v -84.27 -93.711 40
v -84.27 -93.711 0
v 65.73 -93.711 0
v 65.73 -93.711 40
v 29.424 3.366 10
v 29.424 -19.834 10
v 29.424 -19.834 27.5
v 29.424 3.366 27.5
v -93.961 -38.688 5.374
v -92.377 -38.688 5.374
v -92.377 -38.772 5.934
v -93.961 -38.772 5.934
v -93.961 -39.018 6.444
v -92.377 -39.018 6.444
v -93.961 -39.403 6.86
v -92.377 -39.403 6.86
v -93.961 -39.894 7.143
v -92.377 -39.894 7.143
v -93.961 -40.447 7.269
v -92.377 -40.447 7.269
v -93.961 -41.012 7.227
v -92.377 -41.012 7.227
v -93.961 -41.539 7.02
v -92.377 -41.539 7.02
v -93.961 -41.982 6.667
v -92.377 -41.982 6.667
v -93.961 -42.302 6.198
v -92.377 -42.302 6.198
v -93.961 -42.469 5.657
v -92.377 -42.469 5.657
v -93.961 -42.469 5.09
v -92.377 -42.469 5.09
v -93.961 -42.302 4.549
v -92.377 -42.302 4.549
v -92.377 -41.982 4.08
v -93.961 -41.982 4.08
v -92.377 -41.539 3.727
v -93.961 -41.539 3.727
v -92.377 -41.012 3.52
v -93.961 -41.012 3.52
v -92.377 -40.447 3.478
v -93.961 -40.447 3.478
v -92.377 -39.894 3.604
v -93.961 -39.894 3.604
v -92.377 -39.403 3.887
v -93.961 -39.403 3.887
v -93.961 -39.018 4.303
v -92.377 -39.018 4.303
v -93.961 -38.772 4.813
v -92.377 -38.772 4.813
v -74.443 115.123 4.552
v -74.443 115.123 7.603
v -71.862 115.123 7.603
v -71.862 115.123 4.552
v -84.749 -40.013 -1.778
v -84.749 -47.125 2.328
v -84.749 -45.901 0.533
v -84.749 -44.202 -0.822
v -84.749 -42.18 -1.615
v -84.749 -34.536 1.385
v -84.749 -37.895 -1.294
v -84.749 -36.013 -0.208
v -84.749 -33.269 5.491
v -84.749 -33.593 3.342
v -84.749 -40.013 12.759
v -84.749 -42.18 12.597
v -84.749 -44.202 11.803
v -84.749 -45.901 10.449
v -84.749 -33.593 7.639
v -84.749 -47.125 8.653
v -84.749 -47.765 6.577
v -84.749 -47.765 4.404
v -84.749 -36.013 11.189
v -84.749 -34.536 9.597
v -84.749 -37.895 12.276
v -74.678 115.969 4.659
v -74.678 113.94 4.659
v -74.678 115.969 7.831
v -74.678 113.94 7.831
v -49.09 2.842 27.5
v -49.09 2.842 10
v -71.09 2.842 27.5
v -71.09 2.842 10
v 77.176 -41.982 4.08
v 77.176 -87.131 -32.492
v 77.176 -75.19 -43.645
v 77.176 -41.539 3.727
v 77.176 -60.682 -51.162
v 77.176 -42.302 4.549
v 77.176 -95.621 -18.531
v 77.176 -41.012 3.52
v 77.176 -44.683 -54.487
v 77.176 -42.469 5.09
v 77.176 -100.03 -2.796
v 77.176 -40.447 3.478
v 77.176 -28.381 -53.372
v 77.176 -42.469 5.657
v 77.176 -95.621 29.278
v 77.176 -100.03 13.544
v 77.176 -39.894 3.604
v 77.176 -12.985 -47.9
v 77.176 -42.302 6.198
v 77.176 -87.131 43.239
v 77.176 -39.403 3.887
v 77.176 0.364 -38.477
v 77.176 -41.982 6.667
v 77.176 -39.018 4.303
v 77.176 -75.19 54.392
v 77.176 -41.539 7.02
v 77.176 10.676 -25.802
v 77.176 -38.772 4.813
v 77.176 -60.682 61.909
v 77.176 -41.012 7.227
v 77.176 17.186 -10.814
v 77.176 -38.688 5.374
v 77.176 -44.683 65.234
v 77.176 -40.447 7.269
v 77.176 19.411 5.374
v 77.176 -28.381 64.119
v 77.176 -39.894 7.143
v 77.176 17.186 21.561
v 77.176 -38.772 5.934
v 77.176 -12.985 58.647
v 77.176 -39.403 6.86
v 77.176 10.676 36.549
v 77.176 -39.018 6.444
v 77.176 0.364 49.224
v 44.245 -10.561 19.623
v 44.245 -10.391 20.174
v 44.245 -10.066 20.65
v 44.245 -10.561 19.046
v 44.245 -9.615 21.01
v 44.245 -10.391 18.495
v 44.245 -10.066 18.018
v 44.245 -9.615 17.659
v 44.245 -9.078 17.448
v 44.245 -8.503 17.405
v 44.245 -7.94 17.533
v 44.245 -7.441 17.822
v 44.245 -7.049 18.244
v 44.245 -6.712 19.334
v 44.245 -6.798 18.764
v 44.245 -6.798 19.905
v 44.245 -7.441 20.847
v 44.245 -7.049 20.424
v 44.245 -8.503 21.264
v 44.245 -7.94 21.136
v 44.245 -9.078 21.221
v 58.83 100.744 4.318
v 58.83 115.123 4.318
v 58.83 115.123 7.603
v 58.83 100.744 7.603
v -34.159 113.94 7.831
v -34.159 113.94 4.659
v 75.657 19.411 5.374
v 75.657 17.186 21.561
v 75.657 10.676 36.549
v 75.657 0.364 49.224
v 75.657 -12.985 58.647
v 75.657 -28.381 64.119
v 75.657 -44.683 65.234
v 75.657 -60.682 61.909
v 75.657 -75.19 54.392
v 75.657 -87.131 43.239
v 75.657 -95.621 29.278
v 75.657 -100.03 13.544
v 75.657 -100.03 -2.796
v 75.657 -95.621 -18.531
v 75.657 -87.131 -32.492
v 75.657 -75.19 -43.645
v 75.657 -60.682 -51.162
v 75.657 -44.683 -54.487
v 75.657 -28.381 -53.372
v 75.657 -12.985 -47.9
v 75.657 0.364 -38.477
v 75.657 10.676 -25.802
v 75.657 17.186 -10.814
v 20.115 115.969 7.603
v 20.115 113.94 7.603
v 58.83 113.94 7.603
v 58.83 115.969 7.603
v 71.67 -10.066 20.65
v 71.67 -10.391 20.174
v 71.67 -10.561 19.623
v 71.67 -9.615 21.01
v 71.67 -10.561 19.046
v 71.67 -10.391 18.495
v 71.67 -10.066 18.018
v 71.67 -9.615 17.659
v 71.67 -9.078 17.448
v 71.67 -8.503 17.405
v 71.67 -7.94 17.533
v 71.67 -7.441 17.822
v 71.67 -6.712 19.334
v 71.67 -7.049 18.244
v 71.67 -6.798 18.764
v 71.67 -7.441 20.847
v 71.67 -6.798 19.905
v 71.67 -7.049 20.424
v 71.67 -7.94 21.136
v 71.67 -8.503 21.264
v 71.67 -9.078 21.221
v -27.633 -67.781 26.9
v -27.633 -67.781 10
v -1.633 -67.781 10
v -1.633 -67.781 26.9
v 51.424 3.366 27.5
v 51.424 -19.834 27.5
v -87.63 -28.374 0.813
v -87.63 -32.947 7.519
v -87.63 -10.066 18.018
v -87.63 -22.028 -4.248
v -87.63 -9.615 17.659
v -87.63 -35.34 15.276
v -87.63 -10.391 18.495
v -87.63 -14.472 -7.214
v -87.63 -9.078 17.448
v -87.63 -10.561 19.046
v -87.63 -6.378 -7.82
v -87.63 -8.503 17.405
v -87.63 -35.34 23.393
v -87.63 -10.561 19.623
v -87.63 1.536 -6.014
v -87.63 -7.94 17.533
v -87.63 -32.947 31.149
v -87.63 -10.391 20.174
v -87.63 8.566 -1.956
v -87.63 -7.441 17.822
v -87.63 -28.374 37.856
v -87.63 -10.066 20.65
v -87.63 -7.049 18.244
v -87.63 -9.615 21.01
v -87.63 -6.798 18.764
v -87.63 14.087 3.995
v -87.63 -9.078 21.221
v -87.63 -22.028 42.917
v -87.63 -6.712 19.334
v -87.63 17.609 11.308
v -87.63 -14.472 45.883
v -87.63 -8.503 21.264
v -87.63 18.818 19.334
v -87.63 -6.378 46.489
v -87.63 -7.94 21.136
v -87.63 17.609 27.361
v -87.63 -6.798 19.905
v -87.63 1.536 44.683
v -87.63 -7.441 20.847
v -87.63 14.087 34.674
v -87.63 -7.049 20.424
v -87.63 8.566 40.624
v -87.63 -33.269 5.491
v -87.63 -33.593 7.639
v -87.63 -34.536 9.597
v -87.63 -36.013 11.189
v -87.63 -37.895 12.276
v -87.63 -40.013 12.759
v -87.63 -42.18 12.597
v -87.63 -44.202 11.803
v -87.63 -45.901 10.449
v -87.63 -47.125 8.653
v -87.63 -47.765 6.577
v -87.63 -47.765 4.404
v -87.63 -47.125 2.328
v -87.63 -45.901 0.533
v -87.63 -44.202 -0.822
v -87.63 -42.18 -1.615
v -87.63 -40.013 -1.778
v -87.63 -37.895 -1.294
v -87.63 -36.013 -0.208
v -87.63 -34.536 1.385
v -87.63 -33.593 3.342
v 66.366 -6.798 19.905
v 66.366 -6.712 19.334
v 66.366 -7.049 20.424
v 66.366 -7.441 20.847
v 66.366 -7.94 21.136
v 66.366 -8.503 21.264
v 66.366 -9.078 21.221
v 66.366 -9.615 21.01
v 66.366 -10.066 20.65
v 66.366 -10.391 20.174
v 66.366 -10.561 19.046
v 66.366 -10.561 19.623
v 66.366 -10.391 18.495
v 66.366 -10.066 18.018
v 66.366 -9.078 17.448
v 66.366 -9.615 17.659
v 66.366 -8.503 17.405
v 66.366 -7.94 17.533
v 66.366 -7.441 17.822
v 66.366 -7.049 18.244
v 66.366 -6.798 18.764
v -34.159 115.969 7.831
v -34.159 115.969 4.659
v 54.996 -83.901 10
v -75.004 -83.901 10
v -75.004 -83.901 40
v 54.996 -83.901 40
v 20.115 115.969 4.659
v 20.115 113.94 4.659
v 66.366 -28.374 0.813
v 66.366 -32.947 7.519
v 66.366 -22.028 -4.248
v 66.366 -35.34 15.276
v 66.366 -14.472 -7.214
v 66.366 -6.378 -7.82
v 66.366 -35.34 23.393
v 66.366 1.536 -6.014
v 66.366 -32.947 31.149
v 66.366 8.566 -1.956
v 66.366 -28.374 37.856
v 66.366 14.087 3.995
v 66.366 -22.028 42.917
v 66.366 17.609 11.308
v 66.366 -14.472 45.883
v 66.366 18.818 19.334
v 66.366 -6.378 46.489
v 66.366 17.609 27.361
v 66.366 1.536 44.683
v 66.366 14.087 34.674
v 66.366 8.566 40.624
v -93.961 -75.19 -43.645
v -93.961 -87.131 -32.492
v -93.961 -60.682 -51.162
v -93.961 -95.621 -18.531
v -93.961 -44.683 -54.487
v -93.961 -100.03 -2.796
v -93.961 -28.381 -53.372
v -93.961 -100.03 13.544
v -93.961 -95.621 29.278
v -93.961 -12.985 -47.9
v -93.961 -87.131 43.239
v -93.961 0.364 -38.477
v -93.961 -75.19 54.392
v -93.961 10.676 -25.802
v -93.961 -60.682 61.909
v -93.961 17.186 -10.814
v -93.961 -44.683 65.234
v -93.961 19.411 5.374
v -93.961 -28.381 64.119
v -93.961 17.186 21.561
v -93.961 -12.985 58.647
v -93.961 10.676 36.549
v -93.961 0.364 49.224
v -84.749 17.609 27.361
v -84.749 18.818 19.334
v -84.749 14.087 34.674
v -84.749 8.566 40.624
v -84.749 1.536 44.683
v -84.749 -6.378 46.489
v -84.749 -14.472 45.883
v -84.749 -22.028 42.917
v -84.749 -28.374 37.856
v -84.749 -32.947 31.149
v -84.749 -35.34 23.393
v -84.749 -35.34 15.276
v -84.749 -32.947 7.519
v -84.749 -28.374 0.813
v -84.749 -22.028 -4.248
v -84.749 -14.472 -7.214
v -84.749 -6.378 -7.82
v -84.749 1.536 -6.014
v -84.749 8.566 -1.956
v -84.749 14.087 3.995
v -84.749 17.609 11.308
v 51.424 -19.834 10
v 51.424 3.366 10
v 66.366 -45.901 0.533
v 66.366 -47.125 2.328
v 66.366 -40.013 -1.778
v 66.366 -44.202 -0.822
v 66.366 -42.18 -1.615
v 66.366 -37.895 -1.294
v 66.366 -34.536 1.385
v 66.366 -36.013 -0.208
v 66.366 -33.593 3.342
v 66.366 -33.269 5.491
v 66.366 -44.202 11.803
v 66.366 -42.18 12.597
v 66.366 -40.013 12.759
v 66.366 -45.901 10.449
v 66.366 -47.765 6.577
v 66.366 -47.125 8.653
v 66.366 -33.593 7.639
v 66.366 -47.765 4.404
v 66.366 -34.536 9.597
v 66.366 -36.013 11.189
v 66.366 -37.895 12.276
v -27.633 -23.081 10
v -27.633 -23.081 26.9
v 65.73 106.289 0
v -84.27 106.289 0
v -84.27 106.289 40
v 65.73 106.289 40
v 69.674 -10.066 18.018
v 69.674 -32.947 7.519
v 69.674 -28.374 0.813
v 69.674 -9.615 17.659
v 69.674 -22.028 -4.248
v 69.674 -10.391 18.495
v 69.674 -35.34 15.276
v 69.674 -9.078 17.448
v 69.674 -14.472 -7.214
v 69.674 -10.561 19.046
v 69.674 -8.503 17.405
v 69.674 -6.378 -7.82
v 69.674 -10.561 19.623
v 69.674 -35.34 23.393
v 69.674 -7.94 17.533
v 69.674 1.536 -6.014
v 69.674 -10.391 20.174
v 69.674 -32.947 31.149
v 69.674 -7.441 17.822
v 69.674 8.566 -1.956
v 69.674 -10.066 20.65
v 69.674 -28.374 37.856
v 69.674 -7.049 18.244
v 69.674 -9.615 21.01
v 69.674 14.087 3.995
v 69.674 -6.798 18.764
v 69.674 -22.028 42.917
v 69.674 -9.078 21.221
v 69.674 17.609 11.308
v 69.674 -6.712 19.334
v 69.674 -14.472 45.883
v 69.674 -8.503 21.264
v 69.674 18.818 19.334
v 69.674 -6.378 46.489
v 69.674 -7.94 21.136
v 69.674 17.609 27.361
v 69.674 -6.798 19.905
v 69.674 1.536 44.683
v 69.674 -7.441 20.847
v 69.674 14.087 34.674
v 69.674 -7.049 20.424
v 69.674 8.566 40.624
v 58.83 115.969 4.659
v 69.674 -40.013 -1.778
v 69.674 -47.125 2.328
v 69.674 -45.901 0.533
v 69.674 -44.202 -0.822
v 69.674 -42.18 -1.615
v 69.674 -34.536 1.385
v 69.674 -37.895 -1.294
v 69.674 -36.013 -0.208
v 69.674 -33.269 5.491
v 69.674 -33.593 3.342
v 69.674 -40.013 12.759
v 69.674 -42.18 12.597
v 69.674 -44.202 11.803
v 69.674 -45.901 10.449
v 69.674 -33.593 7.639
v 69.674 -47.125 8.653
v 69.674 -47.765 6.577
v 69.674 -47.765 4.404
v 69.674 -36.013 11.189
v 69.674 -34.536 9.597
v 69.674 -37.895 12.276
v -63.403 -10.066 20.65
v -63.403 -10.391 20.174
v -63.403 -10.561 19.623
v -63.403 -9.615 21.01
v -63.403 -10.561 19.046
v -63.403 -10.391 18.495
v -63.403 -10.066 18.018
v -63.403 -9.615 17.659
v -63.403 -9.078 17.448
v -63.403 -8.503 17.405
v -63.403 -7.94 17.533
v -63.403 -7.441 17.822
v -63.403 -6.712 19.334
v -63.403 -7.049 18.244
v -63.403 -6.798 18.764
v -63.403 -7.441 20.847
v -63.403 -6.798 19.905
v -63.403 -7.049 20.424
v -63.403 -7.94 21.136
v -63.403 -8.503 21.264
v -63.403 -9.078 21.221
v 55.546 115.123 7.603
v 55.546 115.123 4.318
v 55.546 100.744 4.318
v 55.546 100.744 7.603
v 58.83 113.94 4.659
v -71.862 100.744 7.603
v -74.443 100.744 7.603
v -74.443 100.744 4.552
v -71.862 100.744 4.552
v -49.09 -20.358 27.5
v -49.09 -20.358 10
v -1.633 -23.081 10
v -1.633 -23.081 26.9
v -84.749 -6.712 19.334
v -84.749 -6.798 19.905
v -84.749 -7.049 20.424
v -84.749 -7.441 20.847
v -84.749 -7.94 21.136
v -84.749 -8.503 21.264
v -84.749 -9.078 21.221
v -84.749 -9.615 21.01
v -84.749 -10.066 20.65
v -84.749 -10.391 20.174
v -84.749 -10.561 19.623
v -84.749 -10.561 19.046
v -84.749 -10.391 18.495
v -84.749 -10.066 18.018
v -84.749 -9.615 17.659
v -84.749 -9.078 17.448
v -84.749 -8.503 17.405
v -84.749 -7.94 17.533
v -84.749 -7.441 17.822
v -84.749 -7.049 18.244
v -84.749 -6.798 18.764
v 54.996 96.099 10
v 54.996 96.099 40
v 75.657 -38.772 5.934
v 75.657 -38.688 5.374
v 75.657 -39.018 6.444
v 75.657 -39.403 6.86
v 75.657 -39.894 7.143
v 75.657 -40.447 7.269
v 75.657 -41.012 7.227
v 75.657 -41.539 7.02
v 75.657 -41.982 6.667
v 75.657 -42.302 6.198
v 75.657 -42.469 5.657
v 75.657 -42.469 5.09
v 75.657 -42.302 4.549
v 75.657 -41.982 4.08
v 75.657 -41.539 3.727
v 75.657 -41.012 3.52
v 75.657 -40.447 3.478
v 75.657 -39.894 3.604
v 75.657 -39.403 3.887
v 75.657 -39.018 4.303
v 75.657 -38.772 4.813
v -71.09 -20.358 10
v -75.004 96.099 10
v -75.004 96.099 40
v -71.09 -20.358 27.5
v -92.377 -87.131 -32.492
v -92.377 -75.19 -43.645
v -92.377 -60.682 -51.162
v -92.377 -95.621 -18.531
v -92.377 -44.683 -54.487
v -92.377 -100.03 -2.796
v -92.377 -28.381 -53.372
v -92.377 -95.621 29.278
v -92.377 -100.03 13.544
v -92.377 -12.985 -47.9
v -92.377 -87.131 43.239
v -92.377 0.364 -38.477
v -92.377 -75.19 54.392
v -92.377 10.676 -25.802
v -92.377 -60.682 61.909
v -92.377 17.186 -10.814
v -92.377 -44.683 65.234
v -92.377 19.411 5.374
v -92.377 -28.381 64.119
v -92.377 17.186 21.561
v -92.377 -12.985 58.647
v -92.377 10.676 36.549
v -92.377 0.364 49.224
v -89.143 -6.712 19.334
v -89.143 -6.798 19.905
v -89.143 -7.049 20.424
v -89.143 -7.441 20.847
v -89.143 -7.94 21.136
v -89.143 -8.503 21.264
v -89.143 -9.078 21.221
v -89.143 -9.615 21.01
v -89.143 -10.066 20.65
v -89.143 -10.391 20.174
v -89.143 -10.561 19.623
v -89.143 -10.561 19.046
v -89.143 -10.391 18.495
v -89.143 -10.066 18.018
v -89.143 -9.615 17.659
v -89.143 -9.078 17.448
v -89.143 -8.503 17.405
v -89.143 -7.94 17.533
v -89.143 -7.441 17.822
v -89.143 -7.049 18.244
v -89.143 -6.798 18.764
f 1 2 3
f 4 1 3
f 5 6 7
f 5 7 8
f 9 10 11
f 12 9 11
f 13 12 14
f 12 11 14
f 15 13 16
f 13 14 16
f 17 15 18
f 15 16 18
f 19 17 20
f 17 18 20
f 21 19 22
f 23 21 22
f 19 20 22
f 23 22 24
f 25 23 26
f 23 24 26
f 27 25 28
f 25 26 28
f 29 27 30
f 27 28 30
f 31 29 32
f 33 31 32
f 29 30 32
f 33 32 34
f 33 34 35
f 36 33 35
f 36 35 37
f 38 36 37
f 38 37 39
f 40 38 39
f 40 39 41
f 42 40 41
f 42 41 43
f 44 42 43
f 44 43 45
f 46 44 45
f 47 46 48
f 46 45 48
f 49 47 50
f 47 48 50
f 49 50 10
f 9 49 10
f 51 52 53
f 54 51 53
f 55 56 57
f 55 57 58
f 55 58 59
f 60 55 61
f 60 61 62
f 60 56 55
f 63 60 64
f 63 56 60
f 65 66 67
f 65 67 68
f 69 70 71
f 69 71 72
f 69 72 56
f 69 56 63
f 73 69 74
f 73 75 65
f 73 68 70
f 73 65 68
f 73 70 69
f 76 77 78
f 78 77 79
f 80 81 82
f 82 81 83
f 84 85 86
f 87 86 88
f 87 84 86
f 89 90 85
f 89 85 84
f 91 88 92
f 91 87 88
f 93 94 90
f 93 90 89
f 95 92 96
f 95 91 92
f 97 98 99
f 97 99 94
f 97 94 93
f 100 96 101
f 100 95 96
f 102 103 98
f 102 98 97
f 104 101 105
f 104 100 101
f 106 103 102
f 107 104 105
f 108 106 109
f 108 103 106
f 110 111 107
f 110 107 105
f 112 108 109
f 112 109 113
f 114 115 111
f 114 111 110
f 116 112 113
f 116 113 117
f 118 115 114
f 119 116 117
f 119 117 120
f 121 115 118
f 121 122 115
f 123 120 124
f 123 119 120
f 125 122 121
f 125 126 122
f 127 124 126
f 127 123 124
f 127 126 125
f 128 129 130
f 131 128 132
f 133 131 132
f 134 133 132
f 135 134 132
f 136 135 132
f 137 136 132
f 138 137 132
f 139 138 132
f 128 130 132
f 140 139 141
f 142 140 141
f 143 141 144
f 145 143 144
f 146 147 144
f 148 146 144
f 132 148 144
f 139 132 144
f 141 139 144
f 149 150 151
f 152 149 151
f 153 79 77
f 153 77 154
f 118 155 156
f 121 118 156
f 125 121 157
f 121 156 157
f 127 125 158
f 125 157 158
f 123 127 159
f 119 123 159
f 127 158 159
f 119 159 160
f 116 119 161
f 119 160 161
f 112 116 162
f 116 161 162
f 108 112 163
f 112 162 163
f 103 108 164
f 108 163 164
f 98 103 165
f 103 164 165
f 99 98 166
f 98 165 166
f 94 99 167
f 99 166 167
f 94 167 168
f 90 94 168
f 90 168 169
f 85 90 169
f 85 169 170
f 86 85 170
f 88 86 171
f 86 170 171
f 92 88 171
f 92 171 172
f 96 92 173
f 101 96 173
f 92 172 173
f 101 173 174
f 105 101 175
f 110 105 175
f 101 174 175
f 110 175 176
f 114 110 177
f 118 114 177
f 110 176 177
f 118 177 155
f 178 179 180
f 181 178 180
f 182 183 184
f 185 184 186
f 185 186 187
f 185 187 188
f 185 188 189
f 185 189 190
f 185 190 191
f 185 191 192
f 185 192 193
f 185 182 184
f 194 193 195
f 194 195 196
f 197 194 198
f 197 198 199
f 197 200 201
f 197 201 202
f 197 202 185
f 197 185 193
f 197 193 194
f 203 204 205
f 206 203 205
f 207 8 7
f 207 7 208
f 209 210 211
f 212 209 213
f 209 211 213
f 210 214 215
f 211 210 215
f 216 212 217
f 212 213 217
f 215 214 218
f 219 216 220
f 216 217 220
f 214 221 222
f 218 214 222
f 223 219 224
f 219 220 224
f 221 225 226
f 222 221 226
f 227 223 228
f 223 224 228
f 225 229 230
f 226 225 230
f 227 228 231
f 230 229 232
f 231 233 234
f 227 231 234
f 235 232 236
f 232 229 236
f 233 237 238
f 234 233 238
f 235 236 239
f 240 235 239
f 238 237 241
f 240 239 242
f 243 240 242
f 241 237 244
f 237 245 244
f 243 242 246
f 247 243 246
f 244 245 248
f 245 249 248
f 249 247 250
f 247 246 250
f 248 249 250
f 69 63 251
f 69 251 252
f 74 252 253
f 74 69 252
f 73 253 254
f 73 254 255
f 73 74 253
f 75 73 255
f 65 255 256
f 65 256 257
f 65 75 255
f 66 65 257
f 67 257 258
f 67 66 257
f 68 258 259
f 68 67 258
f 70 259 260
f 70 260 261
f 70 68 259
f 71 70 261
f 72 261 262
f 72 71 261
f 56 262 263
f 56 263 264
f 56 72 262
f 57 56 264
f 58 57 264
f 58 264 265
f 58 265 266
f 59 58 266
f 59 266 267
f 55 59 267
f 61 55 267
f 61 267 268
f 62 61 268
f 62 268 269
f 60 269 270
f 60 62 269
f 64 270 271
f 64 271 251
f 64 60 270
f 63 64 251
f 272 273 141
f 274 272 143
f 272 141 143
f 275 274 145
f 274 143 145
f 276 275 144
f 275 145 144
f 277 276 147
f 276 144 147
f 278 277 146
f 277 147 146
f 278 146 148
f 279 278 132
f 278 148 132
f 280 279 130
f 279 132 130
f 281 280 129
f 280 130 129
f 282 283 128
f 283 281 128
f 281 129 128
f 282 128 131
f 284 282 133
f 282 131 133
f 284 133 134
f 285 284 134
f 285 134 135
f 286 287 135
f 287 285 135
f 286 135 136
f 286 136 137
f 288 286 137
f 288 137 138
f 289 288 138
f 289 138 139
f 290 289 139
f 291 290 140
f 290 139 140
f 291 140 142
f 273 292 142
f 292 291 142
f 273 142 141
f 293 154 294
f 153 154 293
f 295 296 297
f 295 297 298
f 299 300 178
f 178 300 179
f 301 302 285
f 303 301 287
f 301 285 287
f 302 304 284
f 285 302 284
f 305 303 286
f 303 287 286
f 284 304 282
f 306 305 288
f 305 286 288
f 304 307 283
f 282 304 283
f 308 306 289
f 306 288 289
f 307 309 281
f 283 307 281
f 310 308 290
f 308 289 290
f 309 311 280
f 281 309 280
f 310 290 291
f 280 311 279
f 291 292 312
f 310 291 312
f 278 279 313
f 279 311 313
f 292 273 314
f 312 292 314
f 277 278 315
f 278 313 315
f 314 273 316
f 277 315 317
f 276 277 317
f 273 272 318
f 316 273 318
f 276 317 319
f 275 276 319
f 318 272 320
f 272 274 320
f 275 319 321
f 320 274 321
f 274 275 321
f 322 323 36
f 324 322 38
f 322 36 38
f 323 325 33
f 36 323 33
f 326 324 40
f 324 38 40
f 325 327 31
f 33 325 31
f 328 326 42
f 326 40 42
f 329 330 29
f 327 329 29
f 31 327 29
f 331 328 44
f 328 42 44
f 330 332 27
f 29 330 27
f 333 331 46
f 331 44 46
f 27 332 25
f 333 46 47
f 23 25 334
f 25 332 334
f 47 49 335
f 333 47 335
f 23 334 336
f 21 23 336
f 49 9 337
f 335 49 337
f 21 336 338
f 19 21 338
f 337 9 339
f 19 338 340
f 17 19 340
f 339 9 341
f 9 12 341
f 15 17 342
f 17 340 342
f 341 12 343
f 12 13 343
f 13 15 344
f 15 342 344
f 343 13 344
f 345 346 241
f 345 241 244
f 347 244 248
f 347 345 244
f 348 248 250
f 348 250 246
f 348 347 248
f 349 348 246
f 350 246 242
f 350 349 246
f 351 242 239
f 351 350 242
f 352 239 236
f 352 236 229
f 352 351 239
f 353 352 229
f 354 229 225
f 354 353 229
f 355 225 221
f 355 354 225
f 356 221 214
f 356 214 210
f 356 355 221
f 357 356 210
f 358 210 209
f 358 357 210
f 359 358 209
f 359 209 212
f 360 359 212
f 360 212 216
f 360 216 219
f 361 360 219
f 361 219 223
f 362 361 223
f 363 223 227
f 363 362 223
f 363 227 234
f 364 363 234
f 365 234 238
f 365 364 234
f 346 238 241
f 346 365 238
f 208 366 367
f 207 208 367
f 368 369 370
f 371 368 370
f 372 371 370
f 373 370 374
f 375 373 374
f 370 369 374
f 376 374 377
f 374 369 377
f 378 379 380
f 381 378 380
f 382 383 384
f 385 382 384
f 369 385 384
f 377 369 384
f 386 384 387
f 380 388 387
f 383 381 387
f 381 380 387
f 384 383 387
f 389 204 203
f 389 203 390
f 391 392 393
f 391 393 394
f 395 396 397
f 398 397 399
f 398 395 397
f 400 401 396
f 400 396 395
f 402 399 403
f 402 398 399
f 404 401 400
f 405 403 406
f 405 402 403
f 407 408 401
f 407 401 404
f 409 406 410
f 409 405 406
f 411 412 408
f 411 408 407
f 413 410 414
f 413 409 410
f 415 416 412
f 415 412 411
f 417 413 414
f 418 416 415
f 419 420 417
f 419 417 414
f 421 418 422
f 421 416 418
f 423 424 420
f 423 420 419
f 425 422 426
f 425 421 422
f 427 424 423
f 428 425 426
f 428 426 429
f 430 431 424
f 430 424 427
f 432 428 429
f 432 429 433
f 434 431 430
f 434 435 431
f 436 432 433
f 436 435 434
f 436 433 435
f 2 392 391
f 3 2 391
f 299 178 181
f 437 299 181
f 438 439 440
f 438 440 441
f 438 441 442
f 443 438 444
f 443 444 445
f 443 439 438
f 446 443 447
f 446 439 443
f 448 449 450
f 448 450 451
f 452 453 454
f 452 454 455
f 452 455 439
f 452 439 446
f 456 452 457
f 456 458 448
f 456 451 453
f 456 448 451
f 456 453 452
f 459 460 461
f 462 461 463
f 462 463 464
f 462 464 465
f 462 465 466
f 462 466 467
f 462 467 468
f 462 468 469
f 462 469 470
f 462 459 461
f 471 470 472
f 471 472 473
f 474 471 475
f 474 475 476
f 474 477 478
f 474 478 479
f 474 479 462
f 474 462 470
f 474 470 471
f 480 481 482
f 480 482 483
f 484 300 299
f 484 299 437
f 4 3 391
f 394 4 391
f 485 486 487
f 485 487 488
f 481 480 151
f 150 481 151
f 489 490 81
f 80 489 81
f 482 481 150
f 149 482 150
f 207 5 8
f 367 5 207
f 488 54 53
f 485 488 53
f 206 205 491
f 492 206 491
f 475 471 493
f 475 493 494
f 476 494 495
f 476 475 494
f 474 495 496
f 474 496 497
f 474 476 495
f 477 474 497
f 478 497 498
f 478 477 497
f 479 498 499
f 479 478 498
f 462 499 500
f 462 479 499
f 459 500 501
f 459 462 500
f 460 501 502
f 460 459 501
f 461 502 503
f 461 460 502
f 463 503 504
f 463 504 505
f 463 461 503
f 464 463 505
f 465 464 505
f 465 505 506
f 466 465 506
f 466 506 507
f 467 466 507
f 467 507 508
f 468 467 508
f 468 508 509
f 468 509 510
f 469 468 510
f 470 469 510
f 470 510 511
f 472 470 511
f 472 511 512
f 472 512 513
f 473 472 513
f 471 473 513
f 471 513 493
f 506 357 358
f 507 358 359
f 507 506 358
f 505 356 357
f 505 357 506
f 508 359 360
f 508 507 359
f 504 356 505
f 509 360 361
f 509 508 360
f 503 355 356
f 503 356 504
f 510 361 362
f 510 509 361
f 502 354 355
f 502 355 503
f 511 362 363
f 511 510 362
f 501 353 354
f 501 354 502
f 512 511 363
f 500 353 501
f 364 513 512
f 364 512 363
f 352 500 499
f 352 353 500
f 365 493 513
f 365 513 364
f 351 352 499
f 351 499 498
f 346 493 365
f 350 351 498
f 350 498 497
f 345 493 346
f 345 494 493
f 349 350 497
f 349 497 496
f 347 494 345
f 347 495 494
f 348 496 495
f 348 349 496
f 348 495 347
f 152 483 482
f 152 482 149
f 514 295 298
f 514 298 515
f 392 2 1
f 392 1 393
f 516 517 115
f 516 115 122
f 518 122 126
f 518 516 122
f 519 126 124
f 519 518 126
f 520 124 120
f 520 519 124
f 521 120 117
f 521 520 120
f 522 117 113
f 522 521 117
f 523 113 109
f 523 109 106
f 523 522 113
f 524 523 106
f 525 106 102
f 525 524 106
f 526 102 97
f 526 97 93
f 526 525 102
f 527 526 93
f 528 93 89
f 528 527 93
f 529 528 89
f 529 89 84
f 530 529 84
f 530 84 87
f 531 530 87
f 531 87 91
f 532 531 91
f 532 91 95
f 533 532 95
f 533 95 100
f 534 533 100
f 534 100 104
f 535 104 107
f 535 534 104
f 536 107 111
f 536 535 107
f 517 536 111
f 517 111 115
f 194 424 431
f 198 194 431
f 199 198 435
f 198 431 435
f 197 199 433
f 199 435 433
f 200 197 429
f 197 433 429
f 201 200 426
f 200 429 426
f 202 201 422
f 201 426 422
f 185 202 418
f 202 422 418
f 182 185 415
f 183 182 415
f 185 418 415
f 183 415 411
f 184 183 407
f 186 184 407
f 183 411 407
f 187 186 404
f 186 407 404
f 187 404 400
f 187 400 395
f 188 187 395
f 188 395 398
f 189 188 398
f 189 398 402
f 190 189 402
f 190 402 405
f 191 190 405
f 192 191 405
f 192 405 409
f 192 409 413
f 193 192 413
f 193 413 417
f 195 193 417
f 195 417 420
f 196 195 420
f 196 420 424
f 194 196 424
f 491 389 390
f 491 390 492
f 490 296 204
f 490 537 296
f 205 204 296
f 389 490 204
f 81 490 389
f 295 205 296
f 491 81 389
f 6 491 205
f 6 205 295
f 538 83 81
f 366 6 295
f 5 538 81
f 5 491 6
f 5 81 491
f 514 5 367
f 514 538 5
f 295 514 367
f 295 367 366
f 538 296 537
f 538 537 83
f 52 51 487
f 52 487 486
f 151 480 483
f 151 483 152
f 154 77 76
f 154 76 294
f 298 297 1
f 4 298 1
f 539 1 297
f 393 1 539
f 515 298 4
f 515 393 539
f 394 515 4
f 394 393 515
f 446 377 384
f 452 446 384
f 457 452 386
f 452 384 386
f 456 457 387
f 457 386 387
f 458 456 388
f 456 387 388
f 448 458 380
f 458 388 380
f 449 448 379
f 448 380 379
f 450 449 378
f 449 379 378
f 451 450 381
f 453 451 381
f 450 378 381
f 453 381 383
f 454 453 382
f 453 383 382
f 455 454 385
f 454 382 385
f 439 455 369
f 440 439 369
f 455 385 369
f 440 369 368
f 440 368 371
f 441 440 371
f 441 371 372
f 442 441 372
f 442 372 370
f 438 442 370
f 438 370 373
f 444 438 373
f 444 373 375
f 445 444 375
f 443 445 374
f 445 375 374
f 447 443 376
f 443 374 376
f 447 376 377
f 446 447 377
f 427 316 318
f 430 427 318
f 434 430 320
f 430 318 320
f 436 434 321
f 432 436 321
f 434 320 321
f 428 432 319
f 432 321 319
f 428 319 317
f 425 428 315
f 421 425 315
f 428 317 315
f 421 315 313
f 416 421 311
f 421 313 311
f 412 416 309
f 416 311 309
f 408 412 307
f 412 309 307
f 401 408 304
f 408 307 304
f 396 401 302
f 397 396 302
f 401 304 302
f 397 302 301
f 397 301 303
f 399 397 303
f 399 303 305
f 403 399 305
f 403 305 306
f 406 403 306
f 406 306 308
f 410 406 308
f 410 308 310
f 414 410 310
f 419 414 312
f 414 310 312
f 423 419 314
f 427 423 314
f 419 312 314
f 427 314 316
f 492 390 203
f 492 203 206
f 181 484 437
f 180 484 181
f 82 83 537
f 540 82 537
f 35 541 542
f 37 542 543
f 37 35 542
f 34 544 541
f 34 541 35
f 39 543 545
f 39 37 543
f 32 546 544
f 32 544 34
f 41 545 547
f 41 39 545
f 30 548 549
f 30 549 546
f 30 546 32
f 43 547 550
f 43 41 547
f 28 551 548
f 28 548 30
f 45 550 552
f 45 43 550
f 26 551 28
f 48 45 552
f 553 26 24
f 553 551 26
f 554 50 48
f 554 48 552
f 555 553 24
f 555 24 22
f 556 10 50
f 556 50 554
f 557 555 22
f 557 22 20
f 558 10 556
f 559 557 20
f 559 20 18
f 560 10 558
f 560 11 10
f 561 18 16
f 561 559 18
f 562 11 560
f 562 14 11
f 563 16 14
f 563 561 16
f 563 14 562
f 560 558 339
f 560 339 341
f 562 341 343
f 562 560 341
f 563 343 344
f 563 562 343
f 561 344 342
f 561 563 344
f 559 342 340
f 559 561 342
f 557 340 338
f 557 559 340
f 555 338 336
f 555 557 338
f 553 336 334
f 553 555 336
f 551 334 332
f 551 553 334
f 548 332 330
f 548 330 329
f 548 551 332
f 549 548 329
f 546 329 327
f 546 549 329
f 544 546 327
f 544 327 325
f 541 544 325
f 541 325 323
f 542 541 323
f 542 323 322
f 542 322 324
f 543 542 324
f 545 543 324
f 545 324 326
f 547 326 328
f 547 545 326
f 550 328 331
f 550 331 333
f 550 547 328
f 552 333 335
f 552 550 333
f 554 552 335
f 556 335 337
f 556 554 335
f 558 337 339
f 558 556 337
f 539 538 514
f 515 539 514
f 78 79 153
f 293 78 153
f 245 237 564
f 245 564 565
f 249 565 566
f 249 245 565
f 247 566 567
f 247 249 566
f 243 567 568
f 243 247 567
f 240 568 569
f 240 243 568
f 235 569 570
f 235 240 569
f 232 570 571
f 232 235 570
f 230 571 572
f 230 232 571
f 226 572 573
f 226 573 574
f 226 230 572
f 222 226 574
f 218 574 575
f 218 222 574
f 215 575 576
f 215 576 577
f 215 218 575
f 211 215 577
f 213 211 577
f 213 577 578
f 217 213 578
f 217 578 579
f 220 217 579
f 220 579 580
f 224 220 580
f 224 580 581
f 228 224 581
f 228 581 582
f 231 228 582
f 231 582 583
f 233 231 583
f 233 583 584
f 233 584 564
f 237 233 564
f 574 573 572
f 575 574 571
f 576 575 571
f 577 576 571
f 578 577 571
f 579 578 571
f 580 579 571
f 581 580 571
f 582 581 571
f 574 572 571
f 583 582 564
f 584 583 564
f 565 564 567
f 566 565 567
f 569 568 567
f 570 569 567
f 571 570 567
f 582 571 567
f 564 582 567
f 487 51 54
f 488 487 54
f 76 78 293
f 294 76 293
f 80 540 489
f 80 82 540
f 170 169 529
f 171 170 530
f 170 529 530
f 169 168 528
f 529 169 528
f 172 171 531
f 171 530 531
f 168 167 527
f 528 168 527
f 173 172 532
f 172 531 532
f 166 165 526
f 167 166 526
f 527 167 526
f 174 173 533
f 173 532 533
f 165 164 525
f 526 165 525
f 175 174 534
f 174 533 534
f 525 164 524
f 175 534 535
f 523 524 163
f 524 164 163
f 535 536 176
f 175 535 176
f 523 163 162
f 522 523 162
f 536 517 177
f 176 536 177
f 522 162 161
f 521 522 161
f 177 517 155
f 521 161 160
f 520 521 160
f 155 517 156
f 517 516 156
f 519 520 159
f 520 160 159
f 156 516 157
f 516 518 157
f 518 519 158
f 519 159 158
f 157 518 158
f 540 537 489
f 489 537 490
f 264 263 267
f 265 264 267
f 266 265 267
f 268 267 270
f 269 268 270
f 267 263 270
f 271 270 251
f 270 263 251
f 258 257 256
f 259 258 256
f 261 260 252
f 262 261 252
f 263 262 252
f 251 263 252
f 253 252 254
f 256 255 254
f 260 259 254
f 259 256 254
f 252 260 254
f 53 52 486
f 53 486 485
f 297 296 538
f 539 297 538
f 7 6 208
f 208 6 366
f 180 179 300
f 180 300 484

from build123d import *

# Parameters (mm, degrees)
F0_W      = 150
F0_H      = 200
F0_W_2    = 130
F0_H_2    = 180
F0_W_3    = 26
F0_H_3    = 44.7
F1_DEPTH  = 10
F3_START  = 75.65658
F2_R      = 60
F2_R_2    = 1.9010687787
F3_DEPTH  = 1.51959
F7_START  = 44.24528
F6_R      = 1.9348660317
F7_DEPTH  = 27.42483
F8_START  = -63.40283
F8_DEPTH  = 25.7397
F10_W     = 22
F10_H     = 23.2
F11_DEPTH = 27.5
F12_DEPTH = 40
F13_START = -92.37699
F13_DEPTH = 1.58359
F14_DEPTH = 26.9
F15_START = 66.3657
F9_R      = 27.2310204956
F15_DEPTH = 3.30842
F9_R_2    = 7.2888669106
F16_START = -84.74878
F16_DEPTH = 2.88128
F18_START = -113.94005
F17_W     = 38.7150868773
F17_H     = 2.9439013451
F18_DEPTH = 2.02893
F17_W_2   = 40.5191965401
F17_H_2   = 3.1723510474
F20_START = -100.74361
F19_W     = 3.284920007
F19_H     = 3.2849162817
F20_DEPTH = 14.37931
F19_W_2   = 2.5810077786
F19_H_2   = 3.0502793379


# Not quite as in the source:
# - the program builds the solid bodies; features that only make, move or delete a surface that nothing else refers to are left out


with BuildPart() as f1:
    # F0 (on Top) → F1 (new body)
    with BuildSketch(Plane.XY):
        with Locations((-9.2696487904, 6.2885135242)):
            Rectangle(F0_W, F0_H)
        with Locations((-10.0039294362, 6.098870337)):
            Rectangle(F0_W_2, F0_H_2, mode=Mode.SUBTRACT)
        with Locations((-10.0039294362, 6.098870337)):
            Rectangle(F0_W_2, F0_H_2)
        with Locations((-14.6333261281, -45.4308299661)):
            Rectangle(F0_W_3, F0_H_3, mode=Mode.SUBTRACT)
    extrude(amount=F1_DEPTH)

    # F10 (on Top) → F11 (join)
    with BuildSketch(Plane.XY):
        Polygon((-71.0902935837, -9.8448516801), (-71.0902935837, -20.3584678368), (-49.0902935837, -20.3584678368), (-49.0902935837, 2.8415321632), (-71.0902935837, 2.8415321632), (-71.0902935837, -7.195668295), align=None)
        with Locations((40.4238908535, -8.2341439949)):
            Rectangle(F10_W, F10_H)
    extrude(amount=F11_DEPTH)

    # F0 (on Top) → F12 (join)
    with BuildSketch(Plane.XY):
        with Locations((-9.2696487904, 6.2885135242)):
            Rectangle(F0_W, F0_H)
        with Locations((-10.0039294362, 6.098870337)):
            Rectangle(F0_W_2, F0_H_2, mode=Mode.SUBTRACT)
    extrude(amount=F12_DEPTH)

    # F0 (on Top) → F14 (join)
    with BuildSketch(Plane.XY):
        with Locations((-14.6333261281, -45.4308299661)):
            Rectangle(F0_W_3, F0_H_3)
    extrude(amount=F14_DEPTH)


with BuildPart() as f3:
    # F2 (on Right) → F3 (new body)
    with BuildSketch(Plane.YZ.offset(F3_START)):
        with Locations((-40.5887551606, 5.3735026158)):
            Circle(F2_R)
        with Locations((-40.5887551606, 5.3735026158)):
            Circle(F2_R_2, mode=Mode.SUBTRACT)
    extrude(amount=F3_DEPTH)


with BuildPart() as f7:
    # F6 (on Right) → F7 (new body)
    with BuildSketch(Plane.YZ.offset(F7_START)):
        with Locations((-8.6473254487, 19.3343963474)):
            Circle(F6_R)
    extrude(amount=F7_DEPTH)

    # F9 (on Right) → F15 (join)
    with BuildSketch(Plane.YZ.offset(F15_START)):
        with Locations((-8.4126899019, 19.3343963474)):
            Circle(F9_R)
    extrude(amount=F15_DEPTH)


with BuildPart() as f8:
    # F6 (on Right) → F8 (new body)
    with BuildSketch(Plane.YZ.offset(F8_START)):
        with Locations((-8.6473254487, 19.3343963474)):
            Circle(F6_R)
    extrude(amount=-F8_DEPTH)

    # F9 (on Right) → F16 (join)
    with BuildSketch(Plane.YZ.offset(F16_START)):
        with Locations((-8.4126899019, 19.3343963474)):
            Circle(F9_R)
    extrude(amount=-F16_DEPTH)


with BuildPart() as f13:
    # F2 (on Right) → F13 (new body)
    with BuildSketch(Plane.YZ.offset(F13_START)):
        with Locations((-40.5887551606, 5.3735026158)):
            Circle(F2_R)
        with Locations((-40.5887551606, 5.3735026158)):
            Circle(F2_R_2, mode=Mode.SUBTRACT)
    extrude(amount=-F13_DEPTH)


with BuildPart() as f15:
    # F9 (on Right) → F15, piece 2 (new body)
    with BuildSketch(Plane.YZ.offset(F15_START)):
        with Locations((-40.5579395592, 5.4908203892)):
            Circle(F9_R_2)
    extrude(amount=F15_DEPTH)


with BuildPart() as f16:
    # F9 (on Right) → F16, piece 2 (new body)
    with BuildSketch(Plane.YZ.offset(F16_START)):
        with Locations((-40.5579395592, 5.4908203892)):
            Circle(F9_R_2)
    extrude(amount=-F16_DEPTH)


with BuildPart() as f18:
    # F17 (on Front) → F18 (new body)
    with BuildSketch(Plane.XZ.offset(F18_START)):
        with Locations((39.4729152322, 6.1306017451)):
            Rectangle(F17_W, F17_H)
    extrude(amount=-F18_DEPTH)


with BuildPart() as f18b:
    # F17 (on Front) → F18, piece 2 (new body)
    with BuildSketch(Plane.XZ.offset(F18_START)):
        with Locations((-54.4183310121, 6.2448265962)):
            Rectangle(F17_W_2, F17_H_2)
    extrude(amount=-F18_DEPTH)


with BuildPart() as f20:
    # F19 (on Front) → F20 (new body)
    with BuildSketch(Plane.XZ.offset(F20_START)):
        with Locations((57.1879986674, 5.9600942768)):
            Rectangle(F19_W, F19_H)
    extrude(amount=-F20_DEPTH)


with BuildPart() as f20b:
    # F19 (on Front) → F20, piece 2 (new body)
    with BuildSketch(Plane.XZ.offset(F20_START)):
        with Locations((-73.1527842581, 6.0774127487)):
            Rectangle(F19_W_2, F19_H_2)
    extrude(amount=-F20_DEPTH)


solid = Compound([f1.part, f3.part, f7.part, f8.part, f13.part, f15.part, f16.part, f18.part, f18b.part, f20.part, f20b.part])
